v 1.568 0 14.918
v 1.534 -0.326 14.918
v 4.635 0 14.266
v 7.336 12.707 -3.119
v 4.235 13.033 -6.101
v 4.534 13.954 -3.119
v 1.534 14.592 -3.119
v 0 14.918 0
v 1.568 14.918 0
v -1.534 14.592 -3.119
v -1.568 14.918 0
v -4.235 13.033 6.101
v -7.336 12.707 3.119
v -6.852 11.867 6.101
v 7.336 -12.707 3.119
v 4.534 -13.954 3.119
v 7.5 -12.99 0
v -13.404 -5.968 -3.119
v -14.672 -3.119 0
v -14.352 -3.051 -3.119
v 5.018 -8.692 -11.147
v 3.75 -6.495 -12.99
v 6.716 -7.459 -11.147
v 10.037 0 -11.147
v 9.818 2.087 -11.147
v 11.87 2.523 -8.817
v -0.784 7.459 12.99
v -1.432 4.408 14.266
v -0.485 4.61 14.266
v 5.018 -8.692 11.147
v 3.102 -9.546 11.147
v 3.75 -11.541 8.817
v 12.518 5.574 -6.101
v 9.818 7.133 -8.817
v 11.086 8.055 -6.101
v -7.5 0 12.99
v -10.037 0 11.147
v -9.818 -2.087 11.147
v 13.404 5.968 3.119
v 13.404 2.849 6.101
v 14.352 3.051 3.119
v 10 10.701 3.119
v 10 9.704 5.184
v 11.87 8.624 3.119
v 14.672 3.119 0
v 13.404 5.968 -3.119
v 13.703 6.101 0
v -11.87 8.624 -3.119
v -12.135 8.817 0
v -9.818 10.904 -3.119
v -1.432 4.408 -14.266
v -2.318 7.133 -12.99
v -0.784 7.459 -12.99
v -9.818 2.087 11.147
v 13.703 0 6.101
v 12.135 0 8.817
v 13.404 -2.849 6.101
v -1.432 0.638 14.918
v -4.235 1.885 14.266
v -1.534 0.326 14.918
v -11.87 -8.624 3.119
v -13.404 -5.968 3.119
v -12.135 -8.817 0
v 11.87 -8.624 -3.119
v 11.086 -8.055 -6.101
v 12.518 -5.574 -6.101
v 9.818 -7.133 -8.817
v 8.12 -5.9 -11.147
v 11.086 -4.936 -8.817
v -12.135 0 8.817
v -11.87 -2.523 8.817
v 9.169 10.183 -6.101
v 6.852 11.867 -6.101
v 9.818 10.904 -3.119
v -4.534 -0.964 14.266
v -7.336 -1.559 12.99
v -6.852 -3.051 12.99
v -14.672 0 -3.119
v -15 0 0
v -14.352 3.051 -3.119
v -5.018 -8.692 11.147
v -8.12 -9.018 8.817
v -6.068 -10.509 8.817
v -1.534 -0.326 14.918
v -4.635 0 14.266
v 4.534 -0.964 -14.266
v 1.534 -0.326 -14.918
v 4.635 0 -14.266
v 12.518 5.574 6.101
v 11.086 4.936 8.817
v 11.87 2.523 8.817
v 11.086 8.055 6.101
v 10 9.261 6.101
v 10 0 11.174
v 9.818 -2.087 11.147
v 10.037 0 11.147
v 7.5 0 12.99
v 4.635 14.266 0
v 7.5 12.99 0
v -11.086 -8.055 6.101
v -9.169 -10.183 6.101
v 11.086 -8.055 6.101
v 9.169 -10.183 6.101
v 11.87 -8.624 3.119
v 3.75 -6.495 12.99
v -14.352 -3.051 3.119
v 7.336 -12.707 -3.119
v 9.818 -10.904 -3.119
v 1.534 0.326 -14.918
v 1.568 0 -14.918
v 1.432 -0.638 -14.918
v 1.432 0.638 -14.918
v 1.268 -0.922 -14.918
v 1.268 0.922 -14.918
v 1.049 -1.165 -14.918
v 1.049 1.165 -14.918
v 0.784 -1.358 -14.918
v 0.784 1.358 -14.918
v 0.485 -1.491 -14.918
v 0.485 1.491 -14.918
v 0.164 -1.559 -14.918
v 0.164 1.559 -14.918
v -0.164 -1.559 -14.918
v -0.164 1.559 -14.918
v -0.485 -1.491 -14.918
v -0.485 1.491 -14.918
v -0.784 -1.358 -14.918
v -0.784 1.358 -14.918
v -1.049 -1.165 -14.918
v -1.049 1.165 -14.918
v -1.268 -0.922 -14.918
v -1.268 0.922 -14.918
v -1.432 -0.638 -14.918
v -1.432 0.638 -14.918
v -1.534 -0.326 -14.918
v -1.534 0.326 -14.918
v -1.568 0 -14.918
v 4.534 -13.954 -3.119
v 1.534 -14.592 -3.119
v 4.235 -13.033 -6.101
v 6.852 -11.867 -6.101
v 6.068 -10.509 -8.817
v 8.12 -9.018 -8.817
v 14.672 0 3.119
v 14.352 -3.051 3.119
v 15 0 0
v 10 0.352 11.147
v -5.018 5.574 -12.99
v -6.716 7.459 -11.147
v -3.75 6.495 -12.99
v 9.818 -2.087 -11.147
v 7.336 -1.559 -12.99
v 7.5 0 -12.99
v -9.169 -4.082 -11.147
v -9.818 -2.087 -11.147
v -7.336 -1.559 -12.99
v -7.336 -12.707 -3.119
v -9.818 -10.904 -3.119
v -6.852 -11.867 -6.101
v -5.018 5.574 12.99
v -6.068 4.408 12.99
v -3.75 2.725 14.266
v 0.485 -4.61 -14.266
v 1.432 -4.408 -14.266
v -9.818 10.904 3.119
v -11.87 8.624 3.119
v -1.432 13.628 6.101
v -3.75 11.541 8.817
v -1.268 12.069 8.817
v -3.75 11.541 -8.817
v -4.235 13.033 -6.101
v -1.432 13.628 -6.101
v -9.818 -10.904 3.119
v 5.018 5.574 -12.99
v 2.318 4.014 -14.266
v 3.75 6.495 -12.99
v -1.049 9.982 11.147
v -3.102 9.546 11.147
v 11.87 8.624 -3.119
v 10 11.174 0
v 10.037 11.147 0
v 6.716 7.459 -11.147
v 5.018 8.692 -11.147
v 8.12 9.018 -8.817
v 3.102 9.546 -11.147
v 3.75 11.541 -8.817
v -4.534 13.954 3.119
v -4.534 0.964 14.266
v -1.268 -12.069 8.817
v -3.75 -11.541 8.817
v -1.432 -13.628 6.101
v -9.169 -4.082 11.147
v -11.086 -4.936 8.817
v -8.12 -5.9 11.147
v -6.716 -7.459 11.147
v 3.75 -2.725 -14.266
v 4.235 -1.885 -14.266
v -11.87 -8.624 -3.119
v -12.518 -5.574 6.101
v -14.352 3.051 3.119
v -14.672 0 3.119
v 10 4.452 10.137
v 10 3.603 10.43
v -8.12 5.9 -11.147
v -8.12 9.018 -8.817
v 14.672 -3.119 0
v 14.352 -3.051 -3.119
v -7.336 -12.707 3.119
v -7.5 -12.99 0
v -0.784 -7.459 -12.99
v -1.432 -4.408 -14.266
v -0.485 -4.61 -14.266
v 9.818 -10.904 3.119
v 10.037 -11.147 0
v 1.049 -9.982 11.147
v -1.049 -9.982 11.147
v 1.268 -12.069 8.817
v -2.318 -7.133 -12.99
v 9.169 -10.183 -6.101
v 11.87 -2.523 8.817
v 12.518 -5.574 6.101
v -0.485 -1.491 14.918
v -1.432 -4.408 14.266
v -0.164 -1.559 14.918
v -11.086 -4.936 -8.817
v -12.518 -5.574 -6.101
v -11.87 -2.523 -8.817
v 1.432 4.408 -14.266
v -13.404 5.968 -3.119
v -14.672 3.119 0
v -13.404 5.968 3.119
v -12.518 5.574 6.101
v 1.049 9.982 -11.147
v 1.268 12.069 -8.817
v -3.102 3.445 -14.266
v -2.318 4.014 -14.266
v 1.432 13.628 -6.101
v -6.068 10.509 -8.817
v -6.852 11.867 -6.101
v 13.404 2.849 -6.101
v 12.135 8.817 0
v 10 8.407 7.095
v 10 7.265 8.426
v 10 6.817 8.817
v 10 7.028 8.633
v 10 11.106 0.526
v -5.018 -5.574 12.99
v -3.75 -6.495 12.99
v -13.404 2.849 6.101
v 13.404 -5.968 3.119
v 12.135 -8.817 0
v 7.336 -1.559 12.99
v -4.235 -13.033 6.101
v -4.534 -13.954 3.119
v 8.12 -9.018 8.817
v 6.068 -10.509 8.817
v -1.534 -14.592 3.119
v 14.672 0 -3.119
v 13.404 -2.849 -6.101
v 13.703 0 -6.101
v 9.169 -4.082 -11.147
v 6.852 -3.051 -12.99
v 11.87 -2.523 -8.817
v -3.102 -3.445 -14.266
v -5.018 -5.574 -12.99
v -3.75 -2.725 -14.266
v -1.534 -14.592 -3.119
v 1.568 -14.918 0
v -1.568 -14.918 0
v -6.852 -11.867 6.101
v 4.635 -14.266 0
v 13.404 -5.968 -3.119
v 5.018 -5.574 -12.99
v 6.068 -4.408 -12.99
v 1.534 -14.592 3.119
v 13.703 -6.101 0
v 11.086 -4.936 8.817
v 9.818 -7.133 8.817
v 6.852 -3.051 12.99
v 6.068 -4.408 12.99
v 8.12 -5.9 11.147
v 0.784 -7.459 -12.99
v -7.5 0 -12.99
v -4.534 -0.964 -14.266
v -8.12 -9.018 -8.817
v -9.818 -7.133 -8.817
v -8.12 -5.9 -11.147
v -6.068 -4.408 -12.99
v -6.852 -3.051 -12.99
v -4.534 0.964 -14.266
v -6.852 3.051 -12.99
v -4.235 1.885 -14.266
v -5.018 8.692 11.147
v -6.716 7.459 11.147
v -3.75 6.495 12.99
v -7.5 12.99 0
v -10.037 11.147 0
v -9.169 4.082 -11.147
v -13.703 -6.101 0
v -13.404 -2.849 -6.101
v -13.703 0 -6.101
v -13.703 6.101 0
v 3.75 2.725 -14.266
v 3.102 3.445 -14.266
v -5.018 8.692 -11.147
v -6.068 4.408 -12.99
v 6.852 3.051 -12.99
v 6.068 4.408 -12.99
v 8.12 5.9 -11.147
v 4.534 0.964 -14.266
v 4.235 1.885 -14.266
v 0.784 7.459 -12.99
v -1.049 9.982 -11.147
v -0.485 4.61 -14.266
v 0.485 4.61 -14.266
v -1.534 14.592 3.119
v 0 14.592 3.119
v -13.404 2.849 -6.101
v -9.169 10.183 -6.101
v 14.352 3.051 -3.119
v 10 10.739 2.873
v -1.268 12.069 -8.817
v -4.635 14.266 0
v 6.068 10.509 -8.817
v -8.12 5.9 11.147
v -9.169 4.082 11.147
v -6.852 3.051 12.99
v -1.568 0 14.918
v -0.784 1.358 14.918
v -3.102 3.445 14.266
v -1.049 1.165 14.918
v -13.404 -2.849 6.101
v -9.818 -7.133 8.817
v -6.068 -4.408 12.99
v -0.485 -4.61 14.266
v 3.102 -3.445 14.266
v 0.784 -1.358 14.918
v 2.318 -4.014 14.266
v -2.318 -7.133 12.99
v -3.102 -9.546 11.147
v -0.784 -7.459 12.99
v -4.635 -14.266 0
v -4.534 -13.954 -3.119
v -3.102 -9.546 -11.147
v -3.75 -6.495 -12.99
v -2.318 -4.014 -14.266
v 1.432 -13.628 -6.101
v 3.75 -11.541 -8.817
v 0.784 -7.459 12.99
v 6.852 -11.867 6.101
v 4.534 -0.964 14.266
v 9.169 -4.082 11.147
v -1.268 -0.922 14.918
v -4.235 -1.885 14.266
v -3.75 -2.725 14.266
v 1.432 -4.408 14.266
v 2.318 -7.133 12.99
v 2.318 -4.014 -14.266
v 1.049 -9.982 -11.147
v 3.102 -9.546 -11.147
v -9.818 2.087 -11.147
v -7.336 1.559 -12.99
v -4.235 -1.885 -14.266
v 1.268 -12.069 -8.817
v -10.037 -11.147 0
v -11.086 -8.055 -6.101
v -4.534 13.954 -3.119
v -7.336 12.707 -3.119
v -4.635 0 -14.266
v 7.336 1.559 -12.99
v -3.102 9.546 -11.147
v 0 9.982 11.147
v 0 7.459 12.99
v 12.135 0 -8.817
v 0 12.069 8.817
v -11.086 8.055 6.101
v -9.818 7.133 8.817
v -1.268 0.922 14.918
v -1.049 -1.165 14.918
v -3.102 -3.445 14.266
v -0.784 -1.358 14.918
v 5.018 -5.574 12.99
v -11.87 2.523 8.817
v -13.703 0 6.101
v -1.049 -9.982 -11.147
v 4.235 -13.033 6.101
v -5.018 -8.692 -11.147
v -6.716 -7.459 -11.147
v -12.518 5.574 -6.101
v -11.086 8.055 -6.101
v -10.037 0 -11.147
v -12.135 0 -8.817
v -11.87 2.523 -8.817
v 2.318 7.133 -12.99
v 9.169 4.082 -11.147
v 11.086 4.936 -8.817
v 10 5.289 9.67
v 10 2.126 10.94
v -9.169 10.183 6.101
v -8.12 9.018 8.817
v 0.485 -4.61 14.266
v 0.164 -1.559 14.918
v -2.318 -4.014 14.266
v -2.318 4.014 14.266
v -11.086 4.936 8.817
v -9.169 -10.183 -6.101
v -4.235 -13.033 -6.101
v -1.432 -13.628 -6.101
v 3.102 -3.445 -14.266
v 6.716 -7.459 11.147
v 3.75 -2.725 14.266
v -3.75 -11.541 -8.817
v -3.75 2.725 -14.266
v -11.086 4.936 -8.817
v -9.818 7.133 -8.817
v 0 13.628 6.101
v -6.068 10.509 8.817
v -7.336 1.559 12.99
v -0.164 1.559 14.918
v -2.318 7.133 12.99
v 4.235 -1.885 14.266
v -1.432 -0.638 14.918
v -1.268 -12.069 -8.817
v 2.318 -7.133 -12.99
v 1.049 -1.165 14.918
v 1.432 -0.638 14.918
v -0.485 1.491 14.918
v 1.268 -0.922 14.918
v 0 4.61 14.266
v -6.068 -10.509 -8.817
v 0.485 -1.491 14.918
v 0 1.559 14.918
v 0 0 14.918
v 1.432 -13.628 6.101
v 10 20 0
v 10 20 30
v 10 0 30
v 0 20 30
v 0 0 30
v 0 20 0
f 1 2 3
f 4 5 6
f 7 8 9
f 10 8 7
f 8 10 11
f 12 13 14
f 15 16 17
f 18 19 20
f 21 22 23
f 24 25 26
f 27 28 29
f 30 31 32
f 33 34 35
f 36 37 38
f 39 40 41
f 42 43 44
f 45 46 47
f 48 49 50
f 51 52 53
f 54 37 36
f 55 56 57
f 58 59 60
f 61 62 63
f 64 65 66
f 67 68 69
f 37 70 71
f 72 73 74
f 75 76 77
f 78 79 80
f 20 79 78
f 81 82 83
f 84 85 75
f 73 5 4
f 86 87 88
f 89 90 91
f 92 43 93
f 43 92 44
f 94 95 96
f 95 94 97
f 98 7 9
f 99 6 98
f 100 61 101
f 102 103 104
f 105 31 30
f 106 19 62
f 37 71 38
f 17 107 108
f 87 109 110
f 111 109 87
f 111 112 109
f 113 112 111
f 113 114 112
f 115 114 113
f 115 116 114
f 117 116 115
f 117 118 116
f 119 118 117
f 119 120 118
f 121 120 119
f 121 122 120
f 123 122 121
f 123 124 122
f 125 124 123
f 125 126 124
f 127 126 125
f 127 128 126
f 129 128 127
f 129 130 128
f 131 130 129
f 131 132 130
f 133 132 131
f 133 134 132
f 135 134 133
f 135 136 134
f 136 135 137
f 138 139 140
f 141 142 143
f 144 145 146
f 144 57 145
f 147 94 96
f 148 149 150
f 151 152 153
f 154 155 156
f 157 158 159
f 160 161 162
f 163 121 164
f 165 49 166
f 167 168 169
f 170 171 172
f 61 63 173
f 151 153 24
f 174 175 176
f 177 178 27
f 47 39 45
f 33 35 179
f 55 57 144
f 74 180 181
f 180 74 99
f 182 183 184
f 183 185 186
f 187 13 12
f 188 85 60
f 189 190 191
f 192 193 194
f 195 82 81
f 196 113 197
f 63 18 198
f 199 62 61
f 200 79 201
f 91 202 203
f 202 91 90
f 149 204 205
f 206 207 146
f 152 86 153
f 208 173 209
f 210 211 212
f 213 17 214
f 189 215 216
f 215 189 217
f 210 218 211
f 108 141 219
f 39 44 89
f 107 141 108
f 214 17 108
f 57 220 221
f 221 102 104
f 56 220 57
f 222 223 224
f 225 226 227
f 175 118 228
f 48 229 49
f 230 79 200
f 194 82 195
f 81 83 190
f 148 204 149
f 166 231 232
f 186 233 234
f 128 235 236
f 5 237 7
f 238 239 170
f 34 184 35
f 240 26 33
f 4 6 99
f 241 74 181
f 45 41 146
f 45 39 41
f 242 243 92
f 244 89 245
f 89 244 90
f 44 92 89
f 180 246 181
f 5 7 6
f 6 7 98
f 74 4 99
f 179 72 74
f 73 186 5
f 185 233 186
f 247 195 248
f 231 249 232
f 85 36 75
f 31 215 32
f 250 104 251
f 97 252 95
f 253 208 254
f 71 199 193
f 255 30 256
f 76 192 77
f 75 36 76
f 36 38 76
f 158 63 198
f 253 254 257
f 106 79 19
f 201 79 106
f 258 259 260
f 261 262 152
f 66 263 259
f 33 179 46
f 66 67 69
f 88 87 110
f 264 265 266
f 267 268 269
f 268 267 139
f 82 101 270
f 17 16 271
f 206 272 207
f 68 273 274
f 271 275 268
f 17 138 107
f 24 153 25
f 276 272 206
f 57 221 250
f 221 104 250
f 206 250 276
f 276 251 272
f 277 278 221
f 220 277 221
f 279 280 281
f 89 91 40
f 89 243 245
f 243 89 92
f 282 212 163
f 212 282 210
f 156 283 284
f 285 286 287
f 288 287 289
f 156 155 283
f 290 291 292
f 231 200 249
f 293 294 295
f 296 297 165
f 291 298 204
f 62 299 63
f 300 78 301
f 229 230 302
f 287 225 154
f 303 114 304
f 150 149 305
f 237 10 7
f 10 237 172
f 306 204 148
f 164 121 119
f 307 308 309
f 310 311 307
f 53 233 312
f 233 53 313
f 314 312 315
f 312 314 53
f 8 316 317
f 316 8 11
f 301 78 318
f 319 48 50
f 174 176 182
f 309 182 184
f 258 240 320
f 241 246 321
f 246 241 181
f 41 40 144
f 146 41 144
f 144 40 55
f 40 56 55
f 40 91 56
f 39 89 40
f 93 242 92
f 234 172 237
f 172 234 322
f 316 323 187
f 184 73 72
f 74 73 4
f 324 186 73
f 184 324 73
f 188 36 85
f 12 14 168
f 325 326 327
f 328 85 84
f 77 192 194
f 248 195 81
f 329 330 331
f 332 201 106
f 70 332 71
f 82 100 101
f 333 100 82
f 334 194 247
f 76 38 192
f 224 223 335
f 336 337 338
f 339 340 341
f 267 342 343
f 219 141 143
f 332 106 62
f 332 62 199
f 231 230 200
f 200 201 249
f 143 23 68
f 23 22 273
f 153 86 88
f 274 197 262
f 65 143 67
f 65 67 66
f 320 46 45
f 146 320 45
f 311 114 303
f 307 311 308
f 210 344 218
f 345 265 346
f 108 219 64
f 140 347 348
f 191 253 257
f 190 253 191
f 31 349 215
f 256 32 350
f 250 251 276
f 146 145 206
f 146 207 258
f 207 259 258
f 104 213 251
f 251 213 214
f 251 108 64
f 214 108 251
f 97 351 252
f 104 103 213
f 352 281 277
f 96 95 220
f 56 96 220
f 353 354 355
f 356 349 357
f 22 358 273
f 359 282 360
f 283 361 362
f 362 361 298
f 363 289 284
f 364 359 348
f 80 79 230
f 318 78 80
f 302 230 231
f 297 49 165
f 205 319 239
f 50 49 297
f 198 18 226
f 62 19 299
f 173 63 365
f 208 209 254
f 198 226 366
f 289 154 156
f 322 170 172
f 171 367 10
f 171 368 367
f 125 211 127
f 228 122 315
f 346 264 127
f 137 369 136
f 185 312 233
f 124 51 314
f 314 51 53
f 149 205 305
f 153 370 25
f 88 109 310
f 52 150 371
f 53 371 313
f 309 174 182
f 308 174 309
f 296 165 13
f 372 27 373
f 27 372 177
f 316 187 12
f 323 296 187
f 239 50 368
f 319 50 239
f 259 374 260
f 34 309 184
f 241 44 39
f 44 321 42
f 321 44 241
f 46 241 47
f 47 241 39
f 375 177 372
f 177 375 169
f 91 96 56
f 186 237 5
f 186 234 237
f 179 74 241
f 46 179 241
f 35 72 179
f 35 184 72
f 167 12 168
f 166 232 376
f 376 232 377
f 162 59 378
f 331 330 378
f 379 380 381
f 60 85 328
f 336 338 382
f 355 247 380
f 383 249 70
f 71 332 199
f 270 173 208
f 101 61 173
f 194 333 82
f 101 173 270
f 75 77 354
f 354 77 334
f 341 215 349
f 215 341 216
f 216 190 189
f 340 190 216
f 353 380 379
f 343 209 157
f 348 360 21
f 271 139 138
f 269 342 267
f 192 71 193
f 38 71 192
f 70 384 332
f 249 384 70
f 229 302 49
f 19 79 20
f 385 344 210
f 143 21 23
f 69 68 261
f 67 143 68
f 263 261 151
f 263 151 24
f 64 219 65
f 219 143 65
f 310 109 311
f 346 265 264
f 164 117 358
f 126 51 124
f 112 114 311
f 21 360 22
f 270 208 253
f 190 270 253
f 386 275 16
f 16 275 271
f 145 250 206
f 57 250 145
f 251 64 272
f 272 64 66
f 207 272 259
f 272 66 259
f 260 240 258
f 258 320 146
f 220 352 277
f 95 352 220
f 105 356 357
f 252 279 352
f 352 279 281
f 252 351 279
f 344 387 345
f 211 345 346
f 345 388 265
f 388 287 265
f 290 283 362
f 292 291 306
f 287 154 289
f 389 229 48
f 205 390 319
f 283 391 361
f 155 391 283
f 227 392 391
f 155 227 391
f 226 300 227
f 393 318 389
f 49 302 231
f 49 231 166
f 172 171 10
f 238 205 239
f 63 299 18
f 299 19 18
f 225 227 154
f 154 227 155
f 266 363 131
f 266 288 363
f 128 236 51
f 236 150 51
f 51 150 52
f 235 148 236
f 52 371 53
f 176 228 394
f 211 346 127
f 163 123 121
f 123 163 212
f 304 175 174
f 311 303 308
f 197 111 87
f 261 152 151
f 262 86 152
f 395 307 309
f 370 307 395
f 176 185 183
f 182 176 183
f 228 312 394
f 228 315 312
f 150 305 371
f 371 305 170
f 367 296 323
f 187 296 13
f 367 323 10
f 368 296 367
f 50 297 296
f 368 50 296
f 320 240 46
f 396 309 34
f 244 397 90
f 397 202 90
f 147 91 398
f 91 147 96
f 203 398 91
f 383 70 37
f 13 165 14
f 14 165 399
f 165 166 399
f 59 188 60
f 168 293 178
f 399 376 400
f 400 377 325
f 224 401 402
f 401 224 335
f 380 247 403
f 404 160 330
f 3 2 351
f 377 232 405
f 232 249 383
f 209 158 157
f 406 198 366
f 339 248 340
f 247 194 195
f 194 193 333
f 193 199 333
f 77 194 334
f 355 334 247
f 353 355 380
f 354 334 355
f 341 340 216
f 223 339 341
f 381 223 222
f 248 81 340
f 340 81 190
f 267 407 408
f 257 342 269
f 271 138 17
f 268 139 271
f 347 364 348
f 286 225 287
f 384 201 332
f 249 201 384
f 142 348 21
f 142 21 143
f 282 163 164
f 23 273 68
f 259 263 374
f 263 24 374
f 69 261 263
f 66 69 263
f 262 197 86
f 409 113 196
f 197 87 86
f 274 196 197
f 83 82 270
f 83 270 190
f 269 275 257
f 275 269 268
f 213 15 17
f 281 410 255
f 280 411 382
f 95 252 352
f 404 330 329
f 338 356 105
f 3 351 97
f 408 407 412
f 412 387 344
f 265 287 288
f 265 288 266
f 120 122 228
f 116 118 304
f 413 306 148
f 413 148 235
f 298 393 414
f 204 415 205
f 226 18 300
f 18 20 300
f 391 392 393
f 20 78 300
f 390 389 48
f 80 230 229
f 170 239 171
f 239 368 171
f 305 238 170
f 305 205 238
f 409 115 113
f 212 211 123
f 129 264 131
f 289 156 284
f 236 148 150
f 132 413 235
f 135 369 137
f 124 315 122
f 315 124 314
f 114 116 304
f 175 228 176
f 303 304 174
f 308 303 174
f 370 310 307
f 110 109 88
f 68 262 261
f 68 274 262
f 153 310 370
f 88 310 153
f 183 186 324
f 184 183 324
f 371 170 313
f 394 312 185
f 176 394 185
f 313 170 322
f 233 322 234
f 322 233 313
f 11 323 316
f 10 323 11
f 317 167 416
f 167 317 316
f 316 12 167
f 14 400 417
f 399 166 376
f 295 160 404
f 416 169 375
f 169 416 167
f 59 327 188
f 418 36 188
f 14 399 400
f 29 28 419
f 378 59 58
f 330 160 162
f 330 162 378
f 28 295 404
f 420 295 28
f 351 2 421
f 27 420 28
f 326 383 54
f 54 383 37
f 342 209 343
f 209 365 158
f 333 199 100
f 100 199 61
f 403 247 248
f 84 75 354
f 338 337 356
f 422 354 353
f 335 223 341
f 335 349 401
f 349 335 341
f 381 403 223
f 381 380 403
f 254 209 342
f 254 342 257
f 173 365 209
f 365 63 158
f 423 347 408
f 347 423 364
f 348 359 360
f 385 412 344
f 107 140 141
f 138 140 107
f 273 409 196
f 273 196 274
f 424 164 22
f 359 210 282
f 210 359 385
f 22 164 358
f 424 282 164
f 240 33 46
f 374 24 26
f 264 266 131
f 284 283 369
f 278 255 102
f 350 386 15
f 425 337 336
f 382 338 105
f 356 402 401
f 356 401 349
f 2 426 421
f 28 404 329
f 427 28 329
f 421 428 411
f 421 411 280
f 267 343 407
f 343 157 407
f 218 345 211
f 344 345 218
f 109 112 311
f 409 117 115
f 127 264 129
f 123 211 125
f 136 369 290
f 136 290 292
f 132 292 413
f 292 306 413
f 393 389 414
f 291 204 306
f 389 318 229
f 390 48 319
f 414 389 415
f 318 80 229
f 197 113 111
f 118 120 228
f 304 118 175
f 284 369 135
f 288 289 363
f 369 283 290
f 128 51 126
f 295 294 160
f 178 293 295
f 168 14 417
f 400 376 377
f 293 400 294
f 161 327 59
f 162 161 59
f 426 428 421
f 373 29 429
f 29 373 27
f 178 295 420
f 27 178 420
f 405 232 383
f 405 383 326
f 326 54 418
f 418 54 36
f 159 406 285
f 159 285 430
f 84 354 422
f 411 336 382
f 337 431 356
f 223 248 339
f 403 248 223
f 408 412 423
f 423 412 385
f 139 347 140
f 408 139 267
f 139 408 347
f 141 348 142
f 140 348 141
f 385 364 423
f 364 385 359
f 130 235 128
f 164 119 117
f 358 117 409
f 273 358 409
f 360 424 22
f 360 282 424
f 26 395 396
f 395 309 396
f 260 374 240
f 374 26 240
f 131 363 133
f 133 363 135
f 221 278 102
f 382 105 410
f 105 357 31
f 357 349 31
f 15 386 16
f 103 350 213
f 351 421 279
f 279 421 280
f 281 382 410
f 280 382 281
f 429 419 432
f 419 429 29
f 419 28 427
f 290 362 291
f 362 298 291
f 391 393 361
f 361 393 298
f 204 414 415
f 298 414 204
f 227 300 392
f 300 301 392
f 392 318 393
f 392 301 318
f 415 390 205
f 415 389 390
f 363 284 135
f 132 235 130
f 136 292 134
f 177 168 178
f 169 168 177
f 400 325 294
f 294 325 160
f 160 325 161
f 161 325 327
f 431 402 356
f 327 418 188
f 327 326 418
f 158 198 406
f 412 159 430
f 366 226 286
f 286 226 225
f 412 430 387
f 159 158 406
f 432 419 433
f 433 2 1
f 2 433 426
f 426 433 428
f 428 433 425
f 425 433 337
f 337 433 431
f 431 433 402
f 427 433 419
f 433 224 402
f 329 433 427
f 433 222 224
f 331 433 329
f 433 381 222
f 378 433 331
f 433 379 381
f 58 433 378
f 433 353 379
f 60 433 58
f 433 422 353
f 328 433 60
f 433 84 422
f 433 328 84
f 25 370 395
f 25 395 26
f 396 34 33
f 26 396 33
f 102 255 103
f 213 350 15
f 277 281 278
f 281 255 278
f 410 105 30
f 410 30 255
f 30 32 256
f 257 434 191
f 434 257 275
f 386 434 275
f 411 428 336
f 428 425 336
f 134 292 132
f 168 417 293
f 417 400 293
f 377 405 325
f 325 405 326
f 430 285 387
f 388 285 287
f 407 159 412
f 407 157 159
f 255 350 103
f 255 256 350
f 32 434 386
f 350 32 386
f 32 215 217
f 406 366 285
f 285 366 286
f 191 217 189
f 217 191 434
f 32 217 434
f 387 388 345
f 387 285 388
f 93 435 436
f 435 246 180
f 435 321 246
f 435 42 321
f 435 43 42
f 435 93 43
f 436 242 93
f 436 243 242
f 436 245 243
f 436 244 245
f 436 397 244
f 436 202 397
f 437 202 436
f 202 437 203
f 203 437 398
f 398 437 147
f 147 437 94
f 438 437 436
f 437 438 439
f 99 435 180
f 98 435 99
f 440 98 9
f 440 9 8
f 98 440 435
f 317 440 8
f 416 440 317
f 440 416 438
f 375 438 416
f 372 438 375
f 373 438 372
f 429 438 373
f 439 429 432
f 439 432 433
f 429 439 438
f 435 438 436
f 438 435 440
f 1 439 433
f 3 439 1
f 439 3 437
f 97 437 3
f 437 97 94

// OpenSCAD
union() {
sphere(d=30);
cube(size=[10,20,30]);
}

/*
<json>
    {
        "Name": ["Var 1", "Var 2", "Var 3"],
        "Desc": ["Desc 1"],
        "LowKeyword": ["Lost 1", "Lost 2"],
        "HighKeyword": ["Printed1", "Printed2", "Printed 3", "Printed 4"],
        "varBase": "VarBase1",
        "minDefault": 0.1,
        "maxDefault": [1, 2, 3],
        "minDefaultND": "0.5 * nozzleDiameter",
        "maxDefaultND": "5 * nozzleDiameter",
        "cameraData": "-2.28,2.59,6.06,59.9,0,13.8,113.4",
        "sortOrder": [3, 2, 1],
		"instanceCount": 10
    }
</json>
*/
